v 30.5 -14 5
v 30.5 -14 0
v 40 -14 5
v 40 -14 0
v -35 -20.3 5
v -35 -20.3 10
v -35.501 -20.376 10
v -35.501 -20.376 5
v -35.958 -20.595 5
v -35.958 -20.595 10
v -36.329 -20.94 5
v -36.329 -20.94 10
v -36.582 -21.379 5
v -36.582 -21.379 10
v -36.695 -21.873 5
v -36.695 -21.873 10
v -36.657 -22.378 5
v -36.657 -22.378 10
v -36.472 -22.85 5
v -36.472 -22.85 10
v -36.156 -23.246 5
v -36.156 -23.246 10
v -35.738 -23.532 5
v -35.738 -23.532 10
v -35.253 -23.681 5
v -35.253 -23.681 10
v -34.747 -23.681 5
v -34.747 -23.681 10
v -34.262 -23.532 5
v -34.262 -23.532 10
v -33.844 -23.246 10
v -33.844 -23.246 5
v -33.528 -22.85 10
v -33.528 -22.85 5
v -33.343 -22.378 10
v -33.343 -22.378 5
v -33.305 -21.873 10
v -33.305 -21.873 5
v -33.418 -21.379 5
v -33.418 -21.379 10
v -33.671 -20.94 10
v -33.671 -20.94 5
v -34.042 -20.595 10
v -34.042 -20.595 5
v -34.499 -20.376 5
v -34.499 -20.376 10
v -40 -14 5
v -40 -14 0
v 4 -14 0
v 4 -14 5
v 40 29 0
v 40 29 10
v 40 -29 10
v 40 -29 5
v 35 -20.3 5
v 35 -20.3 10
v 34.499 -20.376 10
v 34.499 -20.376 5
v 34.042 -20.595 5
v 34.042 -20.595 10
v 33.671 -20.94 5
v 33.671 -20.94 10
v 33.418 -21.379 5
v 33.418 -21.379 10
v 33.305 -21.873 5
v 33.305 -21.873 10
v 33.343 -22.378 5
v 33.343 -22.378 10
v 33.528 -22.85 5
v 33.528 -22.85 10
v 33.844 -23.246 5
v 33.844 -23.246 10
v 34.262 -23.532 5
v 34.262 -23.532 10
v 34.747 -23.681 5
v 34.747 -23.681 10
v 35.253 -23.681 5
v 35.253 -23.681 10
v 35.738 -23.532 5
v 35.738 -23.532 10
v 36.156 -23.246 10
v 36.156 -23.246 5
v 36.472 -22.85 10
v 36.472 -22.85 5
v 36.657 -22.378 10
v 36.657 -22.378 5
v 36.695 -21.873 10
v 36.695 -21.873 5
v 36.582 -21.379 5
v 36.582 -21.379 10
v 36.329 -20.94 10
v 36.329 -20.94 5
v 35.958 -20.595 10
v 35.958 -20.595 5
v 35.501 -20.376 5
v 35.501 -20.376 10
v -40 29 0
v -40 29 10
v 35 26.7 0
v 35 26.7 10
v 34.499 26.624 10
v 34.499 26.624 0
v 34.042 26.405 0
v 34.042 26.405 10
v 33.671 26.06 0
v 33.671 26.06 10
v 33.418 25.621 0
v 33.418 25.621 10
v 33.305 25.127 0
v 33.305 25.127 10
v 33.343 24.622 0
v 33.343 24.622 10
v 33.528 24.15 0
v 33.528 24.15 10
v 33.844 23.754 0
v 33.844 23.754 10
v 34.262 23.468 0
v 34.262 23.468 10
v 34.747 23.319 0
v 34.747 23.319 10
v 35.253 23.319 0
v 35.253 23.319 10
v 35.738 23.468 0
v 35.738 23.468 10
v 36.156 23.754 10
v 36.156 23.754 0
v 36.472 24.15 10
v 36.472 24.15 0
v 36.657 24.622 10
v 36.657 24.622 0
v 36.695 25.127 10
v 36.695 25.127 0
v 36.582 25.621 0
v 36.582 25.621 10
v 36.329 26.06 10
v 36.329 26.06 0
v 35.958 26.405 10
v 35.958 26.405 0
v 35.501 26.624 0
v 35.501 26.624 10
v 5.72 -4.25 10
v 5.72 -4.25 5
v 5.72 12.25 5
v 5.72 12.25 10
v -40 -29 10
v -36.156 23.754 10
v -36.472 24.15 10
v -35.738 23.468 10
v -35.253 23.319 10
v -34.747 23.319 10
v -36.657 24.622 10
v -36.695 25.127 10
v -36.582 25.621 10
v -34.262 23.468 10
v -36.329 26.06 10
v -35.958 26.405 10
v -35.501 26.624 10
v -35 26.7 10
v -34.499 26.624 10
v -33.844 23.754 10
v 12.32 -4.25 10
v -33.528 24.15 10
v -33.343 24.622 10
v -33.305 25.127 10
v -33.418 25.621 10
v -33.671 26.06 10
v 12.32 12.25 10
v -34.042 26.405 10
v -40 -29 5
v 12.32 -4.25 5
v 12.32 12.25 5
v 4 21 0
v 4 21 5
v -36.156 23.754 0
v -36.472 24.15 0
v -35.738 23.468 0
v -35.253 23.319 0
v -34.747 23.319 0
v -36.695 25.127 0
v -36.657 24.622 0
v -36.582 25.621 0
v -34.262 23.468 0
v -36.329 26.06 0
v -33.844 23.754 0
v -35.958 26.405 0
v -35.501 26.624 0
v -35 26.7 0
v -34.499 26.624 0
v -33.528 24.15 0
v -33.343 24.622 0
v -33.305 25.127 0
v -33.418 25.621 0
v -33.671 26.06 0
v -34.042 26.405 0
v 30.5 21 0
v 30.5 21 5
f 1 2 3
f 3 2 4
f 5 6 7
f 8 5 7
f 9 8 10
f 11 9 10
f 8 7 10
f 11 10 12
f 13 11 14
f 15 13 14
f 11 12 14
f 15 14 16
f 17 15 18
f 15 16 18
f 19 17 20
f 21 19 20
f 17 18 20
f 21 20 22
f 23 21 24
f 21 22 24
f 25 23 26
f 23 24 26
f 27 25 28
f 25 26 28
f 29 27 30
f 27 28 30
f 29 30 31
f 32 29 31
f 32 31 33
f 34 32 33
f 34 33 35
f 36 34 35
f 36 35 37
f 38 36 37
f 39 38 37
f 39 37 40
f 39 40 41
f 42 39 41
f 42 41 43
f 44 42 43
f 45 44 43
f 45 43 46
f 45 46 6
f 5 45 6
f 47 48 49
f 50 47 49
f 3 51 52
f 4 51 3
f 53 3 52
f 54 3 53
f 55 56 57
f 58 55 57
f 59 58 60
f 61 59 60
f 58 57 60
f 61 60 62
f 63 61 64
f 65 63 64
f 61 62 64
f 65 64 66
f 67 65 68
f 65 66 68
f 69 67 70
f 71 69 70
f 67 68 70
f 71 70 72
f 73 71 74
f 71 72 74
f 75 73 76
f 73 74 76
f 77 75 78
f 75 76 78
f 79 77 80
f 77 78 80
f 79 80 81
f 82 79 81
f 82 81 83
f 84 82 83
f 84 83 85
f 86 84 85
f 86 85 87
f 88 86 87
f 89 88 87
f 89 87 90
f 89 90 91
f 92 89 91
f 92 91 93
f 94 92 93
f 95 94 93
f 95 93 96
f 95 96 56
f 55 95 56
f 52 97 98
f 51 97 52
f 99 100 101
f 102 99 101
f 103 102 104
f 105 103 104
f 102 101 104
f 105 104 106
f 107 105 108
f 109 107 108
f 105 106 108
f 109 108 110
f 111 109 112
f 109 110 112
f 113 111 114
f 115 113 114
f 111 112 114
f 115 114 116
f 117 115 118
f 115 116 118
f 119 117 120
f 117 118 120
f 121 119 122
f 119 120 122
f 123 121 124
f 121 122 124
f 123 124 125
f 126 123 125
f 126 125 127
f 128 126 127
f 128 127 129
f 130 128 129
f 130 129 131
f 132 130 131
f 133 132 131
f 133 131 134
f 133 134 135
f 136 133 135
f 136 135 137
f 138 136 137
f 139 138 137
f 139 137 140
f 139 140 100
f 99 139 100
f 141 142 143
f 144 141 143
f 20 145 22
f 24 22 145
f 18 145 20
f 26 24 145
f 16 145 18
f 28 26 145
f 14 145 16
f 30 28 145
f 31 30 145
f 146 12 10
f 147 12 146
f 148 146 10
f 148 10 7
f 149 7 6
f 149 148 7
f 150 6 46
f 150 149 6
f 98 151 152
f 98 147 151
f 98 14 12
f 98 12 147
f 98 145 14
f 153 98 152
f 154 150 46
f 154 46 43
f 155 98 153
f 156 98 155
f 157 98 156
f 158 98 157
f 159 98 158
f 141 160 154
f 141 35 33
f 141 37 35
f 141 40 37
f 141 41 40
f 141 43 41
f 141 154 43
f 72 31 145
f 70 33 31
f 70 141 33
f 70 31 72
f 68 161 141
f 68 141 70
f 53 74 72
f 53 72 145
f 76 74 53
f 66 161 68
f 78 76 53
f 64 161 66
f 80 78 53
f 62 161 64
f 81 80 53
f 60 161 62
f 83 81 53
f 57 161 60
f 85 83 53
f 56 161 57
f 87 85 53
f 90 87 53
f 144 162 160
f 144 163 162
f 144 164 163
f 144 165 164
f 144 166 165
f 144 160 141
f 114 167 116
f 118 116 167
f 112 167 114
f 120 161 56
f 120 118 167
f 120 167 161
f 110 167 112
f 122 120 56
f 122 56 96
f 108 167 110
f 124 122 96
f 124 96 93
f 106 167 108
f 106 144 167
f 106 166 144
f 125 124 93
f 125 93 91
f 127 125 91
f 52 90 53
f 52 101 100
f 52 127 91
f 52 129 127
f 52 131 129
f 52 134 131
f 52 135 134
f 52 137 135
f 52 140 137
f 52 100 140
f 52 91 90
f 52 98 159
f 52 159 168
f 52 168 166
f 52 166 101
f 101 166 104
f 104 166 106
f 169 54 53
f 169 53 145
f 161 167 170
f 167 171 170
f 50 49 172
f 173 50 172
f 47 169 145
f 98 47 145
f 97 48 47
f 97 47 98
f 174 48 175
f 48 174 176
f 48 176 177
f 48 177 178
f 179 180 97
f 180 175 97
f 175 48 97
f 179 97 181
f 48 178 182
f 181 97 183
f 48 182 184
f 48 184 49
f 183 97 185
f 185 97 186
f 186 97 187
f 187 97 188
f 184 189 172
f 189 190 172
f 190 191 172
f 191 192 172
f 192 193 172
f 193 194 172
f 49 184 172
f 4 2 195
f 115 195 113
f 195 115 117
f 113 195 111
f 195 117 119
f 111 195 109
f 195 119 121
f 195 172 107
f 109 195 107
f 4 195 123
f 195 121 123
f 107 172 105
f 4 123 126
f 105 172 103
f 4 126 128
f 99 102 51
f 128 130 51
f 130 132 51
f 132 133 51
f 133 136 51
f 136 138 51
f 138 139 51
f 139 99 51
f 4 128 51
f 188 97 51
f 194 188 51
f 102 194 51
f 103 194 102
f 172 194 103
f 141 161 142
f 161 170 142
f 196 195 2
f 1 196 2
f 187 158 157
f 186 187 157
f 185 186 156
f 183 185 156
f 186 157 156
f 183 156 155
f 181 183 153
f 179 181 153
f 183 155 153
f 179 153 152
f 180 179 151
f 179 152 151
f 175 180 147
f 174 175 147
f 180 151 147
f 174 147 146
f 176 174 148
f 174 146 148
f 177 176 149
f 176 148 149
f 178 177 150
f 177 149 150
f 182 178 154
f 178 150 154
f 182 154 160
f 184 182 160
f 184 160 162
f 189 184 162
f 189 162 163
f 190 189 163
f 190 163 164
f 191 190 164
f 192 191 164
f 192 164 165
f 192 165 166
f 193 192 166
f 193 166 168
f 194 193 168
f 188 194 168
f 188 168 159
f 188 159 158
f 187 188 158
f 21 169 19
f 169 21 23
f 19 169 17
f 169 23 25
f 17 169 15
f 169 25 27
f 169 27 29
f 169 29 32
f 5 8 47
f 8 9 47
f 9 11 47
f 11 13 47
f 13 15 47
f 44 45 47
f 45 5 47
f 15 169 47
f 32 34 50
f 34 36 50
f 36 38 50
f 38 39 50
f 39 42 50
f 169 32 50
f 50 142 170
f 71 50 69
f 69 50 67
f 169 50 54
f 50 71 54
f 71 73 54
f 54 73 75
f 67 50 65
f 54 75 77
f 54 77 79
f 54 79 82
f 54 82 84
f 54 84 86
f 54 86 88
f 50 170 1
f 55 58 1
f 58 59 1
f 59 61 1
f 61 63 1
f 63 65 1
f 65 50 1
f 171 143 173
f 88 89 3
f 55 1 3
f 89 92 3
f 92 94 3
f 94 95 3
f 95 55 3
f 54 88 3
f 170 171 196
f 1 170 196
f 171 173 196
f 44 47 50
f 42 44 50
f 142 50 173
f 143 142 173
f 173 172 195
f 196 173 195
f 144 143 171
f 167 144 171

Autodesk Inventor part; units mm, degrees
ref_plane "YZ Plane" through (0, 0, 0) normal (1, 0, 0) x (0, 1, 0)
ref_plane "XZ Plane" through (0, 0, 0) normal (0, 1, 0) x (-1, 0, 0)
ref_plane "XY Plane" through (0, 0, 0) normal (0, 0, 1) x (1, 0, 0)
sketch "Skizze1" plane through (0, 0, 0) normal (0, 0, 1) x (1, 0, 0)
  line L0 (-40, 29) -> (40, 29)
  line L1 (40, 29) -> (40, -29)
  line L2 (40, -29) -> (-40, -29)
  line L3 (-40, -29) -> (-40, 29)
  line L4 (-40, 29) -> (40, -29) construction
  line L5 (40, 29) -> (-40, -29) construction
  line L6 (-40, -14) -> (40, -14)
  point P0 (0, 0)
  dimension "d0" = 58
  dimension "d1" = 80
  dimension "d4" = 15
extrude "Extrusion1" add sketch "Skizze1" along normal blind 10
extrude "Extrusion2" cut sketch "Skizze1" along normal blind 5 contours L6 L1 L2 L3
sketch "Skizze2" plane through (0, 0, 0) normal (0, 0, -1) x (-1, 0, 0)
  line L0 (35, -22) -> (-35, -22) construction
  line L1 (-40, -14) -> (40, -14) projected
  line L2 (0, -14) -> (0, -22) construction
  line L3 (40, -14) -> (40, -29) projected
  line L4 (35, 25) -> (-35, 25) construction
  line L5 (-40, 29) -> (40, 29) projected
  point P0 (0, 0)
  point P1 (0, 25)
  dimension "d7" = 8
  dimension "d8" = 5
  dimension "d16" = 70
  dimension "d17" = 4
hole "Bohrung1" at (-35, -22, 0) at (35, -22, 0) at (-35, 25, 0) at (35, 25, 0) direction (0, 0, 1) diameter 3.4 end through all clearance for "Inbusschraube DIN EN ISO 4762" size "M3" standard "DIN"
sketch "Sketch3" plane through (0, 0, 0) normal (0, 0, -1) x (-1, 0, 0)
  line L0 (-30.5, 21) -> (-30.5, -14) projected
  line L1 (-4, 21) -> (-30.5, 21) projected
  line L2 (-4, -14) -> (-4, 21) projected
  line L3 (-4, -14) -> (-30.5, -14)
  point P0 (0, 0)
extrude "Extrusion3" cut sketch "Sketch3" against normal up to surface (5 mm away)
sketch "Sketch4" plane through (0, 0, 5) normal (0, 0, -1) x (-1, 0, 0)
  line L0 (-12.32, -4.25) -> (-5.72, -4.25)
  line L1 (-5.72, -4.25) -> (-5.72, 12.25)
  line L2 (-5.72, 12.25) -> (-12.32, 12.25)
  line L3 (-12.32, 12.25) -> (-12.32, -4.25)
  line L4 (-10.2773, -2.3373) -> (-7.7627, -2.3373) projected
  line L5 (-7.7627, 10.3373) -> (-10.2773, 10.3373) projected
  line L6 (-10.2773, -2.3373) -> (-7.7627, -2.3373)
  line L7 (-7.7627, -2.3373) -> (-7.7627, 10.3373)
  line L8 (-7.7627, 10.3373) -> (-10.2773, 10.3373)
  line L9 (-10.2773, 10.3373) -> (-10.2773, -2.3373)
  line L10 (-10.2773, 4) -> (-12.32, 4) construction
  line L11 (-9.02, -2.3373) -> (-9.02, -4.25) construction
  point P0 (0, 0)
  dimension "d20" = 6.6
  dimension "d21" = 16.5
extrude "Extrusion4" cut sketch "Sketch4" against normal through all contours L3 L2 L1 L0 | L9 L5 L7 L4
equation "\"d0\" = SensorBox_Width"
equation "\"d1\" = SensorBox_Length"
equation "\"SensorBox_Width\" = 58"
equation "\"SensorBox_Length\" = 80"
properties part number "Sensor_Box_Deckel" material "PBT-Kunststoff"
